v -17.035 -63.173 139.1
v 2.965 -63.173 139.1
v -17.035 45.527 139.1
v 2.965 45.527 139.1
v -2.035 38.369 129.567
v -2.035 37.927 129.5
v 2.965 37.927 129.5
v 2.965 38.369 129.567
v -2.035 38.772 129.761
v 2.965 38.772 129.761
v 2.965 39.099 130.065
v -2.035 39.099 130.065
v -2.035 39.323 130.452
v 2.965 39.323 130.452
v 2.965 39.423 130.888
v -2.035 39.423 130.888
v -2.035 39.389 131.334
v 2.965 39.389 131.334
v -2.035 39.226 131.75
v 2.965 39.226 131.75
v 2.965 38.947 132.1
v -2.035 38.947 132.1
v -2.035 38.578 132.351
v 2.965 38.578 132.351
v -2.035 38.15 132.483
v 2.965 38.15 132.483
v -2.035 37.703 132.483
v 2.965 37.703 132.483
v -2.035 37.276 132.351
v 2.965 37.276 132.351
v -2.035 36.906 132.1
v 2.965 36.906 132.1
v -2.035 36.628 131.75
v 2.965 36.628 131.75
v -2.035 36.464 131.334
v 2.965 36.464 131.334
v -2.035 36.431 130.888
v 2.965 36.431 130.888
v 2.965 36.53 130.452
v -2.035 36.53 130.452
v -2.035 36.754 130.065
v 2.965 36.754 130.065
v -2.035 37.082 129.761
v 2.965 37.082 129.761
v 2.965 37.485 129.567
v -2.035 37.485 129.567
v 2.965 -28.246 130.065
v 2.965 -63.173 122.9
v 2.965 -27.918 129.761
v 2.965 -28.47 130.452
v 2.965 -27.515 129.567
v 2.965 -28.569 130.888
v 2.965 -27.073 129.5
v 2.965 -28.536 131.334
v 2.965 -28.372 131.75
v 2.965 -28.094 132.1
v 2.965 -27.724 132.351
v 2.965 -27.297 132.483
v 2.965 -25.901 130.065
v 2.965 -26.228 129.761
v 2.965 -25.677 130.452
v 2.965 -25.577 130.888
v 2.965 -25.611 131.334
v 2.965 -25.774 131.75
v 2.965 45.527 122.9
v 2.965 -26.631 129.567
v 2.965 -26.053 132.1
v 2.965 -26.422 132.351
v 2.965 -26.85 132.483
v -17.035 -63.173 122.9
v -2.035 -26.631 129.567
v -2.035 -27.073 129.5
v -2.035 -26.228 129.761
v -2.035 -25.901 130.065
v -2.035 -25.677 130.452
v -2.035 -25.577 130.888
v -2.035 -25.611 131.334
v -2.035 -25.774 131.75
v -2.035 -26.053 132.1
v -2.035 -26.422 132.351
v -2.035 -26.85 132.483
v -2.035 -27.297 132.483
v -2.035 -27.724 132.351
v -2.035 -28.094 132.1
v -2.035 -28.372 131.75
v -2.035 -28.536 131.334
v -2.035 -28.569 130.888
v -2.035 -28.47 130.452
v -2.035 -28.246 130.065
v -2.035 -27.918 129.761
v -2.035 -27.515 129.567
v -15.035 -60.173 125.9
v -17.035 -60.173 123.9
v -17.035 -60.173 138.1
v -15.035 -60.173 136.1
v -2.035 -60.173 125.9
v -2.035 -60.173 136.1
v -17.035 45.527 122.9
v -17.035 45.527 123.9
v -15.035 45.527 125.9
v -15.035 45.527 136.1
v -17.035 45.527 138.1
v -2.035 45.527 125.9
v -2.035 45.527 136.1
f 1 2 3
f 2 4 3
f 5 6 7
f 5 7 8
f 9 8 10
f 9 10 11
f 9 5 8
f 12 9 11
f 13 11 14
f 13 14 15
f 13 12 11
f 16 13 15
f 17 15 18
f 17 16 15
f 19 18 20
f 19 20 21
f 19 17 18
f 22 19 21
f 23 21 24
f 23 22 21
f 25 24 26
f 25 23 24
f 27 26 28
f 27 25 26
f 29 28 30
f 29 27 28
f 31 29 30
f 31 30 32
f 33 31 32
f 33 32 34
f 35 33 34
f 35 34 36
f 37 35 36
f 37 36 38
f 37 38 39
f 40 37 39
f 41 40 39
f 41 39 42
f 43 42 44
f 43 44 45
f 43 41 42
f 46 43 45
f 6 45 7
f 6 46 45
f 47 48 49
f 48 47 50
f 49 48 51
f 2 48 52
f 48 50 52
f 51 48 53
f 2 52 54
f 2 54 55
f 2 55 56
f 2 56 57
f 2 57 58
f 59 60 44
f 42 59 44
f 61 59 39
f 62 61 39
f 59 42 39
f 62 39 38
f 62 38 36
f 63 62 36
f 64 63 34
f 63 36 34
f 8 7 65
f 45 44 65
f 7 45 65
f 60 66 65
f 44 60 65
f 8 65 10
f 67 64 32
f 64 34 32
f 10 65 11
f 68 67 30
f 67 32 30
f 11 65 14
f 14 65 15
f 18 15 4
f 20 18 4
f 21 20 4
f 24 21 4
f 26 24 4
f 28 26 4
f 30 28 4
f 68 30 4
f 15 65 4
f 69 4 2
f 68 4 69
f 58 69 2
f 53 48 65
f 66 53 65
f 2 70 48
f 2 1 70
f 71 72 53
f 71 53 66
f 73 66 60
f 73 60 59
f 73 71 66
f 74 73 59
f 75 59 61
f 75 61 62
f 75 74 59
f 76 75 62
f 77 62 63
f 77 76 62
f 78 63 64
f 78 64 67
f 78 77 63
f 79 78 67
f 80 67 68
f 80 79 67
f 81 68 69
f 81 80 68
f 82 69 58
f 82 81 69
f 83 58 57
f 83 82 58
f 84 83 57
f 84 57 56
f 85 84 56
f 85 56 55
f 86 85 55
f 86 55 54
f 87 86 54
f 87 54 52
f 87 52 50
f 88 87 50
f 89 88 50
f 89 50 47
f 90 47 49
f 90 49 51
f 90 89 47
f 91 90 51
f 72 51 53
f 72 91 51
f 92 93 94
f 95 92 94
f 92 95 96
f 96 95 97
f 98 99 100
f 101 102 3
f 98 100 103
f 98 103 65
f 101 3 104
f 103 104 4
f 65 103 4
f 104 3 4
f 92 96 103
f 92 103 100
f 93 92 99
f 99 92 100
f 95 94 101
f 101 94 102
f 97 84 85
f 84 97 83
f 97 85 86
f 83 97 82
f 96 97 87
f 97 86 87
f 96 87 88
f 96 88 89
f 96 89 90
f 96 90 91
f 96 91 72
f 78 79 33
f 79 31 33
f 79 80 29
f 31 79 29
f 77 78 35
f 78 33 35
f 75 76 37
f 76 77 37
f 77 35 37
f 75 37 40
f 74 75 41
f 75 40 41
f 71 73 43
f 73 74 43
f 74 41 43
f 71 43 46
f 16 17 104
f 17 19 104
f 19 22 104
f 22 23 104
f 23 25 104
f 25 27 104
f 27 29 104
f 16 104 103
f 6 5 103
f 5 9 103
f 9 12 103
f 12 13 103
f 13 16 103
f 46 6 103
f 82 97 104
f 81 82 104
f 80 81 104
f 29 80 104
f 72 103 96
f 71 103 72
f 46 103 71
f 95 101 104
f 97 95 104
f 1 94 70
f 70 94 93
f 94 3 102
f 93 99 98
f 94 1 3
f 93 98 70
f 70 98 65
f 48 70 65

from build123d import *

# Parameters (mm, degrees)
SKETCH_1_W      = 10
SKETCH_1_H      = 105.5
SKETCH_1_R      = 1.6
SKETCH_1_H_2    = 0.1
SKETCH_1_R_2    = 1.5
EXTRUDE_1_DEPTH = 5
EXTRUDE_2_DEPTH = 105.7
CHAMFER_1_SIZE  = 2
EXTRUDE_3_DEPTH = 3


with BuildPart() as part:
    # ｽｹｯﾁ1 → ﾎﾞｽ - 押し出し1 (new body)
    # profile 1 of 5: a face of its own
    with BuildSketch(Plane(origin=(-2.03481113, 0, 0), x_dir=(0, 0, -1), z_dir=(1, 0, 0))):
        with Locations((-131, -7.323272389)):
            Rectangle(SKETCH_1_W, SKETCH_1_H)
        with Locations((-131, -27.073272389)):
            Circle(SKETCH_1_R, mode=Mode.SUBTRACT)
        with Locations((-131, 37.926727611)):
            Circle(SKETCH_1_R, mode=Mode.SUBTRACT)
    # profile 2 of 5: a face of its own
    with BuildSketch(Plane(origin=(-2.03481113, 0, 0), x_dir=(0, 0, -1), z_dir=(1, 0, 0))):
        Polygon((-136, -60.073272389), (-136, 45.426727611), (-136, 45.526727611), (-136.1, 45.526727611), (-136.1, -60.173272389), (-125.9, -60.173272389), (-125.9, 45.526727611), (-126, 45.526727611), (-126, 45.426727611), (-126, -60.073272389), align=None)
    # profile 3 of 5: a face of its own
    with BuildSketch(Plane(origin=(-2.03481113, 0, 0), x_dir=(0, 0, -1), z_dir=(1, 0, 0))):
        with Locations((-131, 45.476727611)):
            Rectangle(SKETCH_1_W, SKETCH_1_H_2)
    # profile 4 of 5: a face of its own
    with BuildSketch(Plane(origin=(-2.03481113, 0, 0), x_dir=(0, 0, -1), z_dir=(1, 0, 0))):
        with Locations((-131, 37.926727611)):
            Circle(SKETCH_1_R)
        with Locations((-131, 37.926727611)):
            Circle(SKETCH_1_R_2, mode=Mode.SUBTRACT)
    # profile 5 of 5: a face of its own
    with BuildSketch(Plane(origin=(-2.03481113, 0, 0), x_dir=(0, 0, -1), z_dir=(1, 0, 0))):
        with Locations((-131, -27.073272389)):
            Circle(SKETCH_1_R)
        with Locations((-131, -27.073272389)):
            Circle(SKETCH_1_R_2, mode=Mode.SUBTRACT)
    extrude(amount=EXTRUDE_1_DEPTH)

    # ｽｹｯﾁ2 → ﾎﾞｽ - 押し出し2 (add)
    with BuildSketch(Plane.XZ.offset(60.173272389)):
        Polygon((2.96518887, 139.1), (-17.03481113, 139.1), (-17.03481113, 136.1), (-2.03481113, 136.1), (2.96518887, 136.1), align=None)
        Polygon((2.96518887, 122.9), (2.96518887, 125.9), (-2.03481113, 125.9), (-17.03481113, 125.9), (-17.03481113, 122.9), align=None)
    extrude(amount=-EXTRUDE_2_DEPTH)

    # 面取り1
    chamfer_1_edges = [part.edges().sort_by_distance(p)[0] for p in [
        (-17.03481113, -7.323272389, 136.1),
        (-17.03481113, -7.323272389, 125.9),
    ]]
    chamfer(chamfer_1_edges, length=CHAMFER_1_SIZE)

    # ｽｹｯﾁ3 → ﾎﾞｽ - 押し出し3 (add)
    with BuildSketch(Plane.XZ.offset(60.173272389)):
        Polygon((-2.03481113, 136.1), (-2.03481113, 125.9), (-15.03481113, 125.9), (-17.03481113, 123.9), (-17.03481113, 122.9), (2.96518887, 122.9), (2.96518887, 139.1), (-17.03481113, 139.1), (-17.03481113, 138.1), (-15.03481113, 136.1), align=None)
        Polygon((-15.03481113, 136.1), (-17.03481113, 138.1), (-17.03481113, 123.9), (-15.03481113, 125.9), (-2.03481113, 125.9), (-2.03481113, 136.1), align=None)
    extrude(amount=EXTRUDE_3_DEPTH)


solid = part.part
